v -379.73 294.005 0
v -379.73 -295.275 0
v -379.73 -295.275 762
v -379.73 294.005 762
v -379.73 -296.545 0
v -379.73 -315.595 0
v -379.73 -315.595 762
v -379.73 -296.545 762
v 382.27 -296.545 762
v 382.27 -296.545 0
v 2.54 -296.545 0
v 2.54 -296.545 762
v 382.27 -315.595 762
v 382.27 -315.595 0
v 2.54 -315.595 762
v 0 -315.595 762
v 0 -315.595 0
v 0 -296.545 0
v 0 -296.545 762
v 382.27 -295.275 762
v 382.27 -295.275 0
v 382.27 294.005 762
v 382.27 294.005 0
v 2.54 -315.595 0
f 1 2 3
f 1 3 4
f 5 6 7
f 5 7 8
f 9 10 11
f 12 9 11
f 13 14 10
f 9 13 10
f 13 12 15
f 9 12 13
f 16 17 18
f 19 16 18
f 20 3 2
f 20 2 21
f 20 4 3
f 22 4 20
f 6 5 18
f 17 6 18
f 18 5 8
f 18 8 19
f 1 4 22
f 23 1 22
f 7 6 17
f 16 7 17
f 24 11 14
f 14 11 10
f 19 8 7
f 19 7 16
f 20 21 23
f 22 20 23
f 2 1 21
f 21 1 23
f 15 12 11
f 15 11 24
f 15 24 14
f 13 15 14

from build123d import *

# Parameters (mm, degrees)
F0_W     = 762
F0_H     = 589.28
F1_DEPTH = 762
F0_W_2   = 379.73
F0_H_2   = 19.05


# Not quite as in the source:
# - ends of sketch curves that miss each other by under 0.0002 mm in the source are joined


with BuildPart() as f1:
    # F0 (on Top) → F1 (new body)
    with BuildSketch(Plane.XY):
        with Locations((1.27, -0.635)):
            Rectangle(F0_W, F0_H)
    extrude(amount=F1_DEPTH)


with BuildPart() as f1b:
    # F0 (on Top) → F1, piece 2 (new body)
    with BuildSketch(Plane.XY):
        Polygon((382.27, -315.595), (382.27, -296.545), (2.54, -296.545), (2.54, -315.5950048161), align=None)
    extrude(amount=F1_DEPTH)


with BuildPart() as f1c:
    # F0 (on Top) → F1, piece 3 (new body)
    with BuildSketch(Plane.XY):
        with Locations((-189.865, -306.07)):
            Rectangle(F0_W_2, F0_H_2)
    extrude(amount=F1_DEPTH)


solid = Compound([f1.part, f1b.part, f1c.part])
